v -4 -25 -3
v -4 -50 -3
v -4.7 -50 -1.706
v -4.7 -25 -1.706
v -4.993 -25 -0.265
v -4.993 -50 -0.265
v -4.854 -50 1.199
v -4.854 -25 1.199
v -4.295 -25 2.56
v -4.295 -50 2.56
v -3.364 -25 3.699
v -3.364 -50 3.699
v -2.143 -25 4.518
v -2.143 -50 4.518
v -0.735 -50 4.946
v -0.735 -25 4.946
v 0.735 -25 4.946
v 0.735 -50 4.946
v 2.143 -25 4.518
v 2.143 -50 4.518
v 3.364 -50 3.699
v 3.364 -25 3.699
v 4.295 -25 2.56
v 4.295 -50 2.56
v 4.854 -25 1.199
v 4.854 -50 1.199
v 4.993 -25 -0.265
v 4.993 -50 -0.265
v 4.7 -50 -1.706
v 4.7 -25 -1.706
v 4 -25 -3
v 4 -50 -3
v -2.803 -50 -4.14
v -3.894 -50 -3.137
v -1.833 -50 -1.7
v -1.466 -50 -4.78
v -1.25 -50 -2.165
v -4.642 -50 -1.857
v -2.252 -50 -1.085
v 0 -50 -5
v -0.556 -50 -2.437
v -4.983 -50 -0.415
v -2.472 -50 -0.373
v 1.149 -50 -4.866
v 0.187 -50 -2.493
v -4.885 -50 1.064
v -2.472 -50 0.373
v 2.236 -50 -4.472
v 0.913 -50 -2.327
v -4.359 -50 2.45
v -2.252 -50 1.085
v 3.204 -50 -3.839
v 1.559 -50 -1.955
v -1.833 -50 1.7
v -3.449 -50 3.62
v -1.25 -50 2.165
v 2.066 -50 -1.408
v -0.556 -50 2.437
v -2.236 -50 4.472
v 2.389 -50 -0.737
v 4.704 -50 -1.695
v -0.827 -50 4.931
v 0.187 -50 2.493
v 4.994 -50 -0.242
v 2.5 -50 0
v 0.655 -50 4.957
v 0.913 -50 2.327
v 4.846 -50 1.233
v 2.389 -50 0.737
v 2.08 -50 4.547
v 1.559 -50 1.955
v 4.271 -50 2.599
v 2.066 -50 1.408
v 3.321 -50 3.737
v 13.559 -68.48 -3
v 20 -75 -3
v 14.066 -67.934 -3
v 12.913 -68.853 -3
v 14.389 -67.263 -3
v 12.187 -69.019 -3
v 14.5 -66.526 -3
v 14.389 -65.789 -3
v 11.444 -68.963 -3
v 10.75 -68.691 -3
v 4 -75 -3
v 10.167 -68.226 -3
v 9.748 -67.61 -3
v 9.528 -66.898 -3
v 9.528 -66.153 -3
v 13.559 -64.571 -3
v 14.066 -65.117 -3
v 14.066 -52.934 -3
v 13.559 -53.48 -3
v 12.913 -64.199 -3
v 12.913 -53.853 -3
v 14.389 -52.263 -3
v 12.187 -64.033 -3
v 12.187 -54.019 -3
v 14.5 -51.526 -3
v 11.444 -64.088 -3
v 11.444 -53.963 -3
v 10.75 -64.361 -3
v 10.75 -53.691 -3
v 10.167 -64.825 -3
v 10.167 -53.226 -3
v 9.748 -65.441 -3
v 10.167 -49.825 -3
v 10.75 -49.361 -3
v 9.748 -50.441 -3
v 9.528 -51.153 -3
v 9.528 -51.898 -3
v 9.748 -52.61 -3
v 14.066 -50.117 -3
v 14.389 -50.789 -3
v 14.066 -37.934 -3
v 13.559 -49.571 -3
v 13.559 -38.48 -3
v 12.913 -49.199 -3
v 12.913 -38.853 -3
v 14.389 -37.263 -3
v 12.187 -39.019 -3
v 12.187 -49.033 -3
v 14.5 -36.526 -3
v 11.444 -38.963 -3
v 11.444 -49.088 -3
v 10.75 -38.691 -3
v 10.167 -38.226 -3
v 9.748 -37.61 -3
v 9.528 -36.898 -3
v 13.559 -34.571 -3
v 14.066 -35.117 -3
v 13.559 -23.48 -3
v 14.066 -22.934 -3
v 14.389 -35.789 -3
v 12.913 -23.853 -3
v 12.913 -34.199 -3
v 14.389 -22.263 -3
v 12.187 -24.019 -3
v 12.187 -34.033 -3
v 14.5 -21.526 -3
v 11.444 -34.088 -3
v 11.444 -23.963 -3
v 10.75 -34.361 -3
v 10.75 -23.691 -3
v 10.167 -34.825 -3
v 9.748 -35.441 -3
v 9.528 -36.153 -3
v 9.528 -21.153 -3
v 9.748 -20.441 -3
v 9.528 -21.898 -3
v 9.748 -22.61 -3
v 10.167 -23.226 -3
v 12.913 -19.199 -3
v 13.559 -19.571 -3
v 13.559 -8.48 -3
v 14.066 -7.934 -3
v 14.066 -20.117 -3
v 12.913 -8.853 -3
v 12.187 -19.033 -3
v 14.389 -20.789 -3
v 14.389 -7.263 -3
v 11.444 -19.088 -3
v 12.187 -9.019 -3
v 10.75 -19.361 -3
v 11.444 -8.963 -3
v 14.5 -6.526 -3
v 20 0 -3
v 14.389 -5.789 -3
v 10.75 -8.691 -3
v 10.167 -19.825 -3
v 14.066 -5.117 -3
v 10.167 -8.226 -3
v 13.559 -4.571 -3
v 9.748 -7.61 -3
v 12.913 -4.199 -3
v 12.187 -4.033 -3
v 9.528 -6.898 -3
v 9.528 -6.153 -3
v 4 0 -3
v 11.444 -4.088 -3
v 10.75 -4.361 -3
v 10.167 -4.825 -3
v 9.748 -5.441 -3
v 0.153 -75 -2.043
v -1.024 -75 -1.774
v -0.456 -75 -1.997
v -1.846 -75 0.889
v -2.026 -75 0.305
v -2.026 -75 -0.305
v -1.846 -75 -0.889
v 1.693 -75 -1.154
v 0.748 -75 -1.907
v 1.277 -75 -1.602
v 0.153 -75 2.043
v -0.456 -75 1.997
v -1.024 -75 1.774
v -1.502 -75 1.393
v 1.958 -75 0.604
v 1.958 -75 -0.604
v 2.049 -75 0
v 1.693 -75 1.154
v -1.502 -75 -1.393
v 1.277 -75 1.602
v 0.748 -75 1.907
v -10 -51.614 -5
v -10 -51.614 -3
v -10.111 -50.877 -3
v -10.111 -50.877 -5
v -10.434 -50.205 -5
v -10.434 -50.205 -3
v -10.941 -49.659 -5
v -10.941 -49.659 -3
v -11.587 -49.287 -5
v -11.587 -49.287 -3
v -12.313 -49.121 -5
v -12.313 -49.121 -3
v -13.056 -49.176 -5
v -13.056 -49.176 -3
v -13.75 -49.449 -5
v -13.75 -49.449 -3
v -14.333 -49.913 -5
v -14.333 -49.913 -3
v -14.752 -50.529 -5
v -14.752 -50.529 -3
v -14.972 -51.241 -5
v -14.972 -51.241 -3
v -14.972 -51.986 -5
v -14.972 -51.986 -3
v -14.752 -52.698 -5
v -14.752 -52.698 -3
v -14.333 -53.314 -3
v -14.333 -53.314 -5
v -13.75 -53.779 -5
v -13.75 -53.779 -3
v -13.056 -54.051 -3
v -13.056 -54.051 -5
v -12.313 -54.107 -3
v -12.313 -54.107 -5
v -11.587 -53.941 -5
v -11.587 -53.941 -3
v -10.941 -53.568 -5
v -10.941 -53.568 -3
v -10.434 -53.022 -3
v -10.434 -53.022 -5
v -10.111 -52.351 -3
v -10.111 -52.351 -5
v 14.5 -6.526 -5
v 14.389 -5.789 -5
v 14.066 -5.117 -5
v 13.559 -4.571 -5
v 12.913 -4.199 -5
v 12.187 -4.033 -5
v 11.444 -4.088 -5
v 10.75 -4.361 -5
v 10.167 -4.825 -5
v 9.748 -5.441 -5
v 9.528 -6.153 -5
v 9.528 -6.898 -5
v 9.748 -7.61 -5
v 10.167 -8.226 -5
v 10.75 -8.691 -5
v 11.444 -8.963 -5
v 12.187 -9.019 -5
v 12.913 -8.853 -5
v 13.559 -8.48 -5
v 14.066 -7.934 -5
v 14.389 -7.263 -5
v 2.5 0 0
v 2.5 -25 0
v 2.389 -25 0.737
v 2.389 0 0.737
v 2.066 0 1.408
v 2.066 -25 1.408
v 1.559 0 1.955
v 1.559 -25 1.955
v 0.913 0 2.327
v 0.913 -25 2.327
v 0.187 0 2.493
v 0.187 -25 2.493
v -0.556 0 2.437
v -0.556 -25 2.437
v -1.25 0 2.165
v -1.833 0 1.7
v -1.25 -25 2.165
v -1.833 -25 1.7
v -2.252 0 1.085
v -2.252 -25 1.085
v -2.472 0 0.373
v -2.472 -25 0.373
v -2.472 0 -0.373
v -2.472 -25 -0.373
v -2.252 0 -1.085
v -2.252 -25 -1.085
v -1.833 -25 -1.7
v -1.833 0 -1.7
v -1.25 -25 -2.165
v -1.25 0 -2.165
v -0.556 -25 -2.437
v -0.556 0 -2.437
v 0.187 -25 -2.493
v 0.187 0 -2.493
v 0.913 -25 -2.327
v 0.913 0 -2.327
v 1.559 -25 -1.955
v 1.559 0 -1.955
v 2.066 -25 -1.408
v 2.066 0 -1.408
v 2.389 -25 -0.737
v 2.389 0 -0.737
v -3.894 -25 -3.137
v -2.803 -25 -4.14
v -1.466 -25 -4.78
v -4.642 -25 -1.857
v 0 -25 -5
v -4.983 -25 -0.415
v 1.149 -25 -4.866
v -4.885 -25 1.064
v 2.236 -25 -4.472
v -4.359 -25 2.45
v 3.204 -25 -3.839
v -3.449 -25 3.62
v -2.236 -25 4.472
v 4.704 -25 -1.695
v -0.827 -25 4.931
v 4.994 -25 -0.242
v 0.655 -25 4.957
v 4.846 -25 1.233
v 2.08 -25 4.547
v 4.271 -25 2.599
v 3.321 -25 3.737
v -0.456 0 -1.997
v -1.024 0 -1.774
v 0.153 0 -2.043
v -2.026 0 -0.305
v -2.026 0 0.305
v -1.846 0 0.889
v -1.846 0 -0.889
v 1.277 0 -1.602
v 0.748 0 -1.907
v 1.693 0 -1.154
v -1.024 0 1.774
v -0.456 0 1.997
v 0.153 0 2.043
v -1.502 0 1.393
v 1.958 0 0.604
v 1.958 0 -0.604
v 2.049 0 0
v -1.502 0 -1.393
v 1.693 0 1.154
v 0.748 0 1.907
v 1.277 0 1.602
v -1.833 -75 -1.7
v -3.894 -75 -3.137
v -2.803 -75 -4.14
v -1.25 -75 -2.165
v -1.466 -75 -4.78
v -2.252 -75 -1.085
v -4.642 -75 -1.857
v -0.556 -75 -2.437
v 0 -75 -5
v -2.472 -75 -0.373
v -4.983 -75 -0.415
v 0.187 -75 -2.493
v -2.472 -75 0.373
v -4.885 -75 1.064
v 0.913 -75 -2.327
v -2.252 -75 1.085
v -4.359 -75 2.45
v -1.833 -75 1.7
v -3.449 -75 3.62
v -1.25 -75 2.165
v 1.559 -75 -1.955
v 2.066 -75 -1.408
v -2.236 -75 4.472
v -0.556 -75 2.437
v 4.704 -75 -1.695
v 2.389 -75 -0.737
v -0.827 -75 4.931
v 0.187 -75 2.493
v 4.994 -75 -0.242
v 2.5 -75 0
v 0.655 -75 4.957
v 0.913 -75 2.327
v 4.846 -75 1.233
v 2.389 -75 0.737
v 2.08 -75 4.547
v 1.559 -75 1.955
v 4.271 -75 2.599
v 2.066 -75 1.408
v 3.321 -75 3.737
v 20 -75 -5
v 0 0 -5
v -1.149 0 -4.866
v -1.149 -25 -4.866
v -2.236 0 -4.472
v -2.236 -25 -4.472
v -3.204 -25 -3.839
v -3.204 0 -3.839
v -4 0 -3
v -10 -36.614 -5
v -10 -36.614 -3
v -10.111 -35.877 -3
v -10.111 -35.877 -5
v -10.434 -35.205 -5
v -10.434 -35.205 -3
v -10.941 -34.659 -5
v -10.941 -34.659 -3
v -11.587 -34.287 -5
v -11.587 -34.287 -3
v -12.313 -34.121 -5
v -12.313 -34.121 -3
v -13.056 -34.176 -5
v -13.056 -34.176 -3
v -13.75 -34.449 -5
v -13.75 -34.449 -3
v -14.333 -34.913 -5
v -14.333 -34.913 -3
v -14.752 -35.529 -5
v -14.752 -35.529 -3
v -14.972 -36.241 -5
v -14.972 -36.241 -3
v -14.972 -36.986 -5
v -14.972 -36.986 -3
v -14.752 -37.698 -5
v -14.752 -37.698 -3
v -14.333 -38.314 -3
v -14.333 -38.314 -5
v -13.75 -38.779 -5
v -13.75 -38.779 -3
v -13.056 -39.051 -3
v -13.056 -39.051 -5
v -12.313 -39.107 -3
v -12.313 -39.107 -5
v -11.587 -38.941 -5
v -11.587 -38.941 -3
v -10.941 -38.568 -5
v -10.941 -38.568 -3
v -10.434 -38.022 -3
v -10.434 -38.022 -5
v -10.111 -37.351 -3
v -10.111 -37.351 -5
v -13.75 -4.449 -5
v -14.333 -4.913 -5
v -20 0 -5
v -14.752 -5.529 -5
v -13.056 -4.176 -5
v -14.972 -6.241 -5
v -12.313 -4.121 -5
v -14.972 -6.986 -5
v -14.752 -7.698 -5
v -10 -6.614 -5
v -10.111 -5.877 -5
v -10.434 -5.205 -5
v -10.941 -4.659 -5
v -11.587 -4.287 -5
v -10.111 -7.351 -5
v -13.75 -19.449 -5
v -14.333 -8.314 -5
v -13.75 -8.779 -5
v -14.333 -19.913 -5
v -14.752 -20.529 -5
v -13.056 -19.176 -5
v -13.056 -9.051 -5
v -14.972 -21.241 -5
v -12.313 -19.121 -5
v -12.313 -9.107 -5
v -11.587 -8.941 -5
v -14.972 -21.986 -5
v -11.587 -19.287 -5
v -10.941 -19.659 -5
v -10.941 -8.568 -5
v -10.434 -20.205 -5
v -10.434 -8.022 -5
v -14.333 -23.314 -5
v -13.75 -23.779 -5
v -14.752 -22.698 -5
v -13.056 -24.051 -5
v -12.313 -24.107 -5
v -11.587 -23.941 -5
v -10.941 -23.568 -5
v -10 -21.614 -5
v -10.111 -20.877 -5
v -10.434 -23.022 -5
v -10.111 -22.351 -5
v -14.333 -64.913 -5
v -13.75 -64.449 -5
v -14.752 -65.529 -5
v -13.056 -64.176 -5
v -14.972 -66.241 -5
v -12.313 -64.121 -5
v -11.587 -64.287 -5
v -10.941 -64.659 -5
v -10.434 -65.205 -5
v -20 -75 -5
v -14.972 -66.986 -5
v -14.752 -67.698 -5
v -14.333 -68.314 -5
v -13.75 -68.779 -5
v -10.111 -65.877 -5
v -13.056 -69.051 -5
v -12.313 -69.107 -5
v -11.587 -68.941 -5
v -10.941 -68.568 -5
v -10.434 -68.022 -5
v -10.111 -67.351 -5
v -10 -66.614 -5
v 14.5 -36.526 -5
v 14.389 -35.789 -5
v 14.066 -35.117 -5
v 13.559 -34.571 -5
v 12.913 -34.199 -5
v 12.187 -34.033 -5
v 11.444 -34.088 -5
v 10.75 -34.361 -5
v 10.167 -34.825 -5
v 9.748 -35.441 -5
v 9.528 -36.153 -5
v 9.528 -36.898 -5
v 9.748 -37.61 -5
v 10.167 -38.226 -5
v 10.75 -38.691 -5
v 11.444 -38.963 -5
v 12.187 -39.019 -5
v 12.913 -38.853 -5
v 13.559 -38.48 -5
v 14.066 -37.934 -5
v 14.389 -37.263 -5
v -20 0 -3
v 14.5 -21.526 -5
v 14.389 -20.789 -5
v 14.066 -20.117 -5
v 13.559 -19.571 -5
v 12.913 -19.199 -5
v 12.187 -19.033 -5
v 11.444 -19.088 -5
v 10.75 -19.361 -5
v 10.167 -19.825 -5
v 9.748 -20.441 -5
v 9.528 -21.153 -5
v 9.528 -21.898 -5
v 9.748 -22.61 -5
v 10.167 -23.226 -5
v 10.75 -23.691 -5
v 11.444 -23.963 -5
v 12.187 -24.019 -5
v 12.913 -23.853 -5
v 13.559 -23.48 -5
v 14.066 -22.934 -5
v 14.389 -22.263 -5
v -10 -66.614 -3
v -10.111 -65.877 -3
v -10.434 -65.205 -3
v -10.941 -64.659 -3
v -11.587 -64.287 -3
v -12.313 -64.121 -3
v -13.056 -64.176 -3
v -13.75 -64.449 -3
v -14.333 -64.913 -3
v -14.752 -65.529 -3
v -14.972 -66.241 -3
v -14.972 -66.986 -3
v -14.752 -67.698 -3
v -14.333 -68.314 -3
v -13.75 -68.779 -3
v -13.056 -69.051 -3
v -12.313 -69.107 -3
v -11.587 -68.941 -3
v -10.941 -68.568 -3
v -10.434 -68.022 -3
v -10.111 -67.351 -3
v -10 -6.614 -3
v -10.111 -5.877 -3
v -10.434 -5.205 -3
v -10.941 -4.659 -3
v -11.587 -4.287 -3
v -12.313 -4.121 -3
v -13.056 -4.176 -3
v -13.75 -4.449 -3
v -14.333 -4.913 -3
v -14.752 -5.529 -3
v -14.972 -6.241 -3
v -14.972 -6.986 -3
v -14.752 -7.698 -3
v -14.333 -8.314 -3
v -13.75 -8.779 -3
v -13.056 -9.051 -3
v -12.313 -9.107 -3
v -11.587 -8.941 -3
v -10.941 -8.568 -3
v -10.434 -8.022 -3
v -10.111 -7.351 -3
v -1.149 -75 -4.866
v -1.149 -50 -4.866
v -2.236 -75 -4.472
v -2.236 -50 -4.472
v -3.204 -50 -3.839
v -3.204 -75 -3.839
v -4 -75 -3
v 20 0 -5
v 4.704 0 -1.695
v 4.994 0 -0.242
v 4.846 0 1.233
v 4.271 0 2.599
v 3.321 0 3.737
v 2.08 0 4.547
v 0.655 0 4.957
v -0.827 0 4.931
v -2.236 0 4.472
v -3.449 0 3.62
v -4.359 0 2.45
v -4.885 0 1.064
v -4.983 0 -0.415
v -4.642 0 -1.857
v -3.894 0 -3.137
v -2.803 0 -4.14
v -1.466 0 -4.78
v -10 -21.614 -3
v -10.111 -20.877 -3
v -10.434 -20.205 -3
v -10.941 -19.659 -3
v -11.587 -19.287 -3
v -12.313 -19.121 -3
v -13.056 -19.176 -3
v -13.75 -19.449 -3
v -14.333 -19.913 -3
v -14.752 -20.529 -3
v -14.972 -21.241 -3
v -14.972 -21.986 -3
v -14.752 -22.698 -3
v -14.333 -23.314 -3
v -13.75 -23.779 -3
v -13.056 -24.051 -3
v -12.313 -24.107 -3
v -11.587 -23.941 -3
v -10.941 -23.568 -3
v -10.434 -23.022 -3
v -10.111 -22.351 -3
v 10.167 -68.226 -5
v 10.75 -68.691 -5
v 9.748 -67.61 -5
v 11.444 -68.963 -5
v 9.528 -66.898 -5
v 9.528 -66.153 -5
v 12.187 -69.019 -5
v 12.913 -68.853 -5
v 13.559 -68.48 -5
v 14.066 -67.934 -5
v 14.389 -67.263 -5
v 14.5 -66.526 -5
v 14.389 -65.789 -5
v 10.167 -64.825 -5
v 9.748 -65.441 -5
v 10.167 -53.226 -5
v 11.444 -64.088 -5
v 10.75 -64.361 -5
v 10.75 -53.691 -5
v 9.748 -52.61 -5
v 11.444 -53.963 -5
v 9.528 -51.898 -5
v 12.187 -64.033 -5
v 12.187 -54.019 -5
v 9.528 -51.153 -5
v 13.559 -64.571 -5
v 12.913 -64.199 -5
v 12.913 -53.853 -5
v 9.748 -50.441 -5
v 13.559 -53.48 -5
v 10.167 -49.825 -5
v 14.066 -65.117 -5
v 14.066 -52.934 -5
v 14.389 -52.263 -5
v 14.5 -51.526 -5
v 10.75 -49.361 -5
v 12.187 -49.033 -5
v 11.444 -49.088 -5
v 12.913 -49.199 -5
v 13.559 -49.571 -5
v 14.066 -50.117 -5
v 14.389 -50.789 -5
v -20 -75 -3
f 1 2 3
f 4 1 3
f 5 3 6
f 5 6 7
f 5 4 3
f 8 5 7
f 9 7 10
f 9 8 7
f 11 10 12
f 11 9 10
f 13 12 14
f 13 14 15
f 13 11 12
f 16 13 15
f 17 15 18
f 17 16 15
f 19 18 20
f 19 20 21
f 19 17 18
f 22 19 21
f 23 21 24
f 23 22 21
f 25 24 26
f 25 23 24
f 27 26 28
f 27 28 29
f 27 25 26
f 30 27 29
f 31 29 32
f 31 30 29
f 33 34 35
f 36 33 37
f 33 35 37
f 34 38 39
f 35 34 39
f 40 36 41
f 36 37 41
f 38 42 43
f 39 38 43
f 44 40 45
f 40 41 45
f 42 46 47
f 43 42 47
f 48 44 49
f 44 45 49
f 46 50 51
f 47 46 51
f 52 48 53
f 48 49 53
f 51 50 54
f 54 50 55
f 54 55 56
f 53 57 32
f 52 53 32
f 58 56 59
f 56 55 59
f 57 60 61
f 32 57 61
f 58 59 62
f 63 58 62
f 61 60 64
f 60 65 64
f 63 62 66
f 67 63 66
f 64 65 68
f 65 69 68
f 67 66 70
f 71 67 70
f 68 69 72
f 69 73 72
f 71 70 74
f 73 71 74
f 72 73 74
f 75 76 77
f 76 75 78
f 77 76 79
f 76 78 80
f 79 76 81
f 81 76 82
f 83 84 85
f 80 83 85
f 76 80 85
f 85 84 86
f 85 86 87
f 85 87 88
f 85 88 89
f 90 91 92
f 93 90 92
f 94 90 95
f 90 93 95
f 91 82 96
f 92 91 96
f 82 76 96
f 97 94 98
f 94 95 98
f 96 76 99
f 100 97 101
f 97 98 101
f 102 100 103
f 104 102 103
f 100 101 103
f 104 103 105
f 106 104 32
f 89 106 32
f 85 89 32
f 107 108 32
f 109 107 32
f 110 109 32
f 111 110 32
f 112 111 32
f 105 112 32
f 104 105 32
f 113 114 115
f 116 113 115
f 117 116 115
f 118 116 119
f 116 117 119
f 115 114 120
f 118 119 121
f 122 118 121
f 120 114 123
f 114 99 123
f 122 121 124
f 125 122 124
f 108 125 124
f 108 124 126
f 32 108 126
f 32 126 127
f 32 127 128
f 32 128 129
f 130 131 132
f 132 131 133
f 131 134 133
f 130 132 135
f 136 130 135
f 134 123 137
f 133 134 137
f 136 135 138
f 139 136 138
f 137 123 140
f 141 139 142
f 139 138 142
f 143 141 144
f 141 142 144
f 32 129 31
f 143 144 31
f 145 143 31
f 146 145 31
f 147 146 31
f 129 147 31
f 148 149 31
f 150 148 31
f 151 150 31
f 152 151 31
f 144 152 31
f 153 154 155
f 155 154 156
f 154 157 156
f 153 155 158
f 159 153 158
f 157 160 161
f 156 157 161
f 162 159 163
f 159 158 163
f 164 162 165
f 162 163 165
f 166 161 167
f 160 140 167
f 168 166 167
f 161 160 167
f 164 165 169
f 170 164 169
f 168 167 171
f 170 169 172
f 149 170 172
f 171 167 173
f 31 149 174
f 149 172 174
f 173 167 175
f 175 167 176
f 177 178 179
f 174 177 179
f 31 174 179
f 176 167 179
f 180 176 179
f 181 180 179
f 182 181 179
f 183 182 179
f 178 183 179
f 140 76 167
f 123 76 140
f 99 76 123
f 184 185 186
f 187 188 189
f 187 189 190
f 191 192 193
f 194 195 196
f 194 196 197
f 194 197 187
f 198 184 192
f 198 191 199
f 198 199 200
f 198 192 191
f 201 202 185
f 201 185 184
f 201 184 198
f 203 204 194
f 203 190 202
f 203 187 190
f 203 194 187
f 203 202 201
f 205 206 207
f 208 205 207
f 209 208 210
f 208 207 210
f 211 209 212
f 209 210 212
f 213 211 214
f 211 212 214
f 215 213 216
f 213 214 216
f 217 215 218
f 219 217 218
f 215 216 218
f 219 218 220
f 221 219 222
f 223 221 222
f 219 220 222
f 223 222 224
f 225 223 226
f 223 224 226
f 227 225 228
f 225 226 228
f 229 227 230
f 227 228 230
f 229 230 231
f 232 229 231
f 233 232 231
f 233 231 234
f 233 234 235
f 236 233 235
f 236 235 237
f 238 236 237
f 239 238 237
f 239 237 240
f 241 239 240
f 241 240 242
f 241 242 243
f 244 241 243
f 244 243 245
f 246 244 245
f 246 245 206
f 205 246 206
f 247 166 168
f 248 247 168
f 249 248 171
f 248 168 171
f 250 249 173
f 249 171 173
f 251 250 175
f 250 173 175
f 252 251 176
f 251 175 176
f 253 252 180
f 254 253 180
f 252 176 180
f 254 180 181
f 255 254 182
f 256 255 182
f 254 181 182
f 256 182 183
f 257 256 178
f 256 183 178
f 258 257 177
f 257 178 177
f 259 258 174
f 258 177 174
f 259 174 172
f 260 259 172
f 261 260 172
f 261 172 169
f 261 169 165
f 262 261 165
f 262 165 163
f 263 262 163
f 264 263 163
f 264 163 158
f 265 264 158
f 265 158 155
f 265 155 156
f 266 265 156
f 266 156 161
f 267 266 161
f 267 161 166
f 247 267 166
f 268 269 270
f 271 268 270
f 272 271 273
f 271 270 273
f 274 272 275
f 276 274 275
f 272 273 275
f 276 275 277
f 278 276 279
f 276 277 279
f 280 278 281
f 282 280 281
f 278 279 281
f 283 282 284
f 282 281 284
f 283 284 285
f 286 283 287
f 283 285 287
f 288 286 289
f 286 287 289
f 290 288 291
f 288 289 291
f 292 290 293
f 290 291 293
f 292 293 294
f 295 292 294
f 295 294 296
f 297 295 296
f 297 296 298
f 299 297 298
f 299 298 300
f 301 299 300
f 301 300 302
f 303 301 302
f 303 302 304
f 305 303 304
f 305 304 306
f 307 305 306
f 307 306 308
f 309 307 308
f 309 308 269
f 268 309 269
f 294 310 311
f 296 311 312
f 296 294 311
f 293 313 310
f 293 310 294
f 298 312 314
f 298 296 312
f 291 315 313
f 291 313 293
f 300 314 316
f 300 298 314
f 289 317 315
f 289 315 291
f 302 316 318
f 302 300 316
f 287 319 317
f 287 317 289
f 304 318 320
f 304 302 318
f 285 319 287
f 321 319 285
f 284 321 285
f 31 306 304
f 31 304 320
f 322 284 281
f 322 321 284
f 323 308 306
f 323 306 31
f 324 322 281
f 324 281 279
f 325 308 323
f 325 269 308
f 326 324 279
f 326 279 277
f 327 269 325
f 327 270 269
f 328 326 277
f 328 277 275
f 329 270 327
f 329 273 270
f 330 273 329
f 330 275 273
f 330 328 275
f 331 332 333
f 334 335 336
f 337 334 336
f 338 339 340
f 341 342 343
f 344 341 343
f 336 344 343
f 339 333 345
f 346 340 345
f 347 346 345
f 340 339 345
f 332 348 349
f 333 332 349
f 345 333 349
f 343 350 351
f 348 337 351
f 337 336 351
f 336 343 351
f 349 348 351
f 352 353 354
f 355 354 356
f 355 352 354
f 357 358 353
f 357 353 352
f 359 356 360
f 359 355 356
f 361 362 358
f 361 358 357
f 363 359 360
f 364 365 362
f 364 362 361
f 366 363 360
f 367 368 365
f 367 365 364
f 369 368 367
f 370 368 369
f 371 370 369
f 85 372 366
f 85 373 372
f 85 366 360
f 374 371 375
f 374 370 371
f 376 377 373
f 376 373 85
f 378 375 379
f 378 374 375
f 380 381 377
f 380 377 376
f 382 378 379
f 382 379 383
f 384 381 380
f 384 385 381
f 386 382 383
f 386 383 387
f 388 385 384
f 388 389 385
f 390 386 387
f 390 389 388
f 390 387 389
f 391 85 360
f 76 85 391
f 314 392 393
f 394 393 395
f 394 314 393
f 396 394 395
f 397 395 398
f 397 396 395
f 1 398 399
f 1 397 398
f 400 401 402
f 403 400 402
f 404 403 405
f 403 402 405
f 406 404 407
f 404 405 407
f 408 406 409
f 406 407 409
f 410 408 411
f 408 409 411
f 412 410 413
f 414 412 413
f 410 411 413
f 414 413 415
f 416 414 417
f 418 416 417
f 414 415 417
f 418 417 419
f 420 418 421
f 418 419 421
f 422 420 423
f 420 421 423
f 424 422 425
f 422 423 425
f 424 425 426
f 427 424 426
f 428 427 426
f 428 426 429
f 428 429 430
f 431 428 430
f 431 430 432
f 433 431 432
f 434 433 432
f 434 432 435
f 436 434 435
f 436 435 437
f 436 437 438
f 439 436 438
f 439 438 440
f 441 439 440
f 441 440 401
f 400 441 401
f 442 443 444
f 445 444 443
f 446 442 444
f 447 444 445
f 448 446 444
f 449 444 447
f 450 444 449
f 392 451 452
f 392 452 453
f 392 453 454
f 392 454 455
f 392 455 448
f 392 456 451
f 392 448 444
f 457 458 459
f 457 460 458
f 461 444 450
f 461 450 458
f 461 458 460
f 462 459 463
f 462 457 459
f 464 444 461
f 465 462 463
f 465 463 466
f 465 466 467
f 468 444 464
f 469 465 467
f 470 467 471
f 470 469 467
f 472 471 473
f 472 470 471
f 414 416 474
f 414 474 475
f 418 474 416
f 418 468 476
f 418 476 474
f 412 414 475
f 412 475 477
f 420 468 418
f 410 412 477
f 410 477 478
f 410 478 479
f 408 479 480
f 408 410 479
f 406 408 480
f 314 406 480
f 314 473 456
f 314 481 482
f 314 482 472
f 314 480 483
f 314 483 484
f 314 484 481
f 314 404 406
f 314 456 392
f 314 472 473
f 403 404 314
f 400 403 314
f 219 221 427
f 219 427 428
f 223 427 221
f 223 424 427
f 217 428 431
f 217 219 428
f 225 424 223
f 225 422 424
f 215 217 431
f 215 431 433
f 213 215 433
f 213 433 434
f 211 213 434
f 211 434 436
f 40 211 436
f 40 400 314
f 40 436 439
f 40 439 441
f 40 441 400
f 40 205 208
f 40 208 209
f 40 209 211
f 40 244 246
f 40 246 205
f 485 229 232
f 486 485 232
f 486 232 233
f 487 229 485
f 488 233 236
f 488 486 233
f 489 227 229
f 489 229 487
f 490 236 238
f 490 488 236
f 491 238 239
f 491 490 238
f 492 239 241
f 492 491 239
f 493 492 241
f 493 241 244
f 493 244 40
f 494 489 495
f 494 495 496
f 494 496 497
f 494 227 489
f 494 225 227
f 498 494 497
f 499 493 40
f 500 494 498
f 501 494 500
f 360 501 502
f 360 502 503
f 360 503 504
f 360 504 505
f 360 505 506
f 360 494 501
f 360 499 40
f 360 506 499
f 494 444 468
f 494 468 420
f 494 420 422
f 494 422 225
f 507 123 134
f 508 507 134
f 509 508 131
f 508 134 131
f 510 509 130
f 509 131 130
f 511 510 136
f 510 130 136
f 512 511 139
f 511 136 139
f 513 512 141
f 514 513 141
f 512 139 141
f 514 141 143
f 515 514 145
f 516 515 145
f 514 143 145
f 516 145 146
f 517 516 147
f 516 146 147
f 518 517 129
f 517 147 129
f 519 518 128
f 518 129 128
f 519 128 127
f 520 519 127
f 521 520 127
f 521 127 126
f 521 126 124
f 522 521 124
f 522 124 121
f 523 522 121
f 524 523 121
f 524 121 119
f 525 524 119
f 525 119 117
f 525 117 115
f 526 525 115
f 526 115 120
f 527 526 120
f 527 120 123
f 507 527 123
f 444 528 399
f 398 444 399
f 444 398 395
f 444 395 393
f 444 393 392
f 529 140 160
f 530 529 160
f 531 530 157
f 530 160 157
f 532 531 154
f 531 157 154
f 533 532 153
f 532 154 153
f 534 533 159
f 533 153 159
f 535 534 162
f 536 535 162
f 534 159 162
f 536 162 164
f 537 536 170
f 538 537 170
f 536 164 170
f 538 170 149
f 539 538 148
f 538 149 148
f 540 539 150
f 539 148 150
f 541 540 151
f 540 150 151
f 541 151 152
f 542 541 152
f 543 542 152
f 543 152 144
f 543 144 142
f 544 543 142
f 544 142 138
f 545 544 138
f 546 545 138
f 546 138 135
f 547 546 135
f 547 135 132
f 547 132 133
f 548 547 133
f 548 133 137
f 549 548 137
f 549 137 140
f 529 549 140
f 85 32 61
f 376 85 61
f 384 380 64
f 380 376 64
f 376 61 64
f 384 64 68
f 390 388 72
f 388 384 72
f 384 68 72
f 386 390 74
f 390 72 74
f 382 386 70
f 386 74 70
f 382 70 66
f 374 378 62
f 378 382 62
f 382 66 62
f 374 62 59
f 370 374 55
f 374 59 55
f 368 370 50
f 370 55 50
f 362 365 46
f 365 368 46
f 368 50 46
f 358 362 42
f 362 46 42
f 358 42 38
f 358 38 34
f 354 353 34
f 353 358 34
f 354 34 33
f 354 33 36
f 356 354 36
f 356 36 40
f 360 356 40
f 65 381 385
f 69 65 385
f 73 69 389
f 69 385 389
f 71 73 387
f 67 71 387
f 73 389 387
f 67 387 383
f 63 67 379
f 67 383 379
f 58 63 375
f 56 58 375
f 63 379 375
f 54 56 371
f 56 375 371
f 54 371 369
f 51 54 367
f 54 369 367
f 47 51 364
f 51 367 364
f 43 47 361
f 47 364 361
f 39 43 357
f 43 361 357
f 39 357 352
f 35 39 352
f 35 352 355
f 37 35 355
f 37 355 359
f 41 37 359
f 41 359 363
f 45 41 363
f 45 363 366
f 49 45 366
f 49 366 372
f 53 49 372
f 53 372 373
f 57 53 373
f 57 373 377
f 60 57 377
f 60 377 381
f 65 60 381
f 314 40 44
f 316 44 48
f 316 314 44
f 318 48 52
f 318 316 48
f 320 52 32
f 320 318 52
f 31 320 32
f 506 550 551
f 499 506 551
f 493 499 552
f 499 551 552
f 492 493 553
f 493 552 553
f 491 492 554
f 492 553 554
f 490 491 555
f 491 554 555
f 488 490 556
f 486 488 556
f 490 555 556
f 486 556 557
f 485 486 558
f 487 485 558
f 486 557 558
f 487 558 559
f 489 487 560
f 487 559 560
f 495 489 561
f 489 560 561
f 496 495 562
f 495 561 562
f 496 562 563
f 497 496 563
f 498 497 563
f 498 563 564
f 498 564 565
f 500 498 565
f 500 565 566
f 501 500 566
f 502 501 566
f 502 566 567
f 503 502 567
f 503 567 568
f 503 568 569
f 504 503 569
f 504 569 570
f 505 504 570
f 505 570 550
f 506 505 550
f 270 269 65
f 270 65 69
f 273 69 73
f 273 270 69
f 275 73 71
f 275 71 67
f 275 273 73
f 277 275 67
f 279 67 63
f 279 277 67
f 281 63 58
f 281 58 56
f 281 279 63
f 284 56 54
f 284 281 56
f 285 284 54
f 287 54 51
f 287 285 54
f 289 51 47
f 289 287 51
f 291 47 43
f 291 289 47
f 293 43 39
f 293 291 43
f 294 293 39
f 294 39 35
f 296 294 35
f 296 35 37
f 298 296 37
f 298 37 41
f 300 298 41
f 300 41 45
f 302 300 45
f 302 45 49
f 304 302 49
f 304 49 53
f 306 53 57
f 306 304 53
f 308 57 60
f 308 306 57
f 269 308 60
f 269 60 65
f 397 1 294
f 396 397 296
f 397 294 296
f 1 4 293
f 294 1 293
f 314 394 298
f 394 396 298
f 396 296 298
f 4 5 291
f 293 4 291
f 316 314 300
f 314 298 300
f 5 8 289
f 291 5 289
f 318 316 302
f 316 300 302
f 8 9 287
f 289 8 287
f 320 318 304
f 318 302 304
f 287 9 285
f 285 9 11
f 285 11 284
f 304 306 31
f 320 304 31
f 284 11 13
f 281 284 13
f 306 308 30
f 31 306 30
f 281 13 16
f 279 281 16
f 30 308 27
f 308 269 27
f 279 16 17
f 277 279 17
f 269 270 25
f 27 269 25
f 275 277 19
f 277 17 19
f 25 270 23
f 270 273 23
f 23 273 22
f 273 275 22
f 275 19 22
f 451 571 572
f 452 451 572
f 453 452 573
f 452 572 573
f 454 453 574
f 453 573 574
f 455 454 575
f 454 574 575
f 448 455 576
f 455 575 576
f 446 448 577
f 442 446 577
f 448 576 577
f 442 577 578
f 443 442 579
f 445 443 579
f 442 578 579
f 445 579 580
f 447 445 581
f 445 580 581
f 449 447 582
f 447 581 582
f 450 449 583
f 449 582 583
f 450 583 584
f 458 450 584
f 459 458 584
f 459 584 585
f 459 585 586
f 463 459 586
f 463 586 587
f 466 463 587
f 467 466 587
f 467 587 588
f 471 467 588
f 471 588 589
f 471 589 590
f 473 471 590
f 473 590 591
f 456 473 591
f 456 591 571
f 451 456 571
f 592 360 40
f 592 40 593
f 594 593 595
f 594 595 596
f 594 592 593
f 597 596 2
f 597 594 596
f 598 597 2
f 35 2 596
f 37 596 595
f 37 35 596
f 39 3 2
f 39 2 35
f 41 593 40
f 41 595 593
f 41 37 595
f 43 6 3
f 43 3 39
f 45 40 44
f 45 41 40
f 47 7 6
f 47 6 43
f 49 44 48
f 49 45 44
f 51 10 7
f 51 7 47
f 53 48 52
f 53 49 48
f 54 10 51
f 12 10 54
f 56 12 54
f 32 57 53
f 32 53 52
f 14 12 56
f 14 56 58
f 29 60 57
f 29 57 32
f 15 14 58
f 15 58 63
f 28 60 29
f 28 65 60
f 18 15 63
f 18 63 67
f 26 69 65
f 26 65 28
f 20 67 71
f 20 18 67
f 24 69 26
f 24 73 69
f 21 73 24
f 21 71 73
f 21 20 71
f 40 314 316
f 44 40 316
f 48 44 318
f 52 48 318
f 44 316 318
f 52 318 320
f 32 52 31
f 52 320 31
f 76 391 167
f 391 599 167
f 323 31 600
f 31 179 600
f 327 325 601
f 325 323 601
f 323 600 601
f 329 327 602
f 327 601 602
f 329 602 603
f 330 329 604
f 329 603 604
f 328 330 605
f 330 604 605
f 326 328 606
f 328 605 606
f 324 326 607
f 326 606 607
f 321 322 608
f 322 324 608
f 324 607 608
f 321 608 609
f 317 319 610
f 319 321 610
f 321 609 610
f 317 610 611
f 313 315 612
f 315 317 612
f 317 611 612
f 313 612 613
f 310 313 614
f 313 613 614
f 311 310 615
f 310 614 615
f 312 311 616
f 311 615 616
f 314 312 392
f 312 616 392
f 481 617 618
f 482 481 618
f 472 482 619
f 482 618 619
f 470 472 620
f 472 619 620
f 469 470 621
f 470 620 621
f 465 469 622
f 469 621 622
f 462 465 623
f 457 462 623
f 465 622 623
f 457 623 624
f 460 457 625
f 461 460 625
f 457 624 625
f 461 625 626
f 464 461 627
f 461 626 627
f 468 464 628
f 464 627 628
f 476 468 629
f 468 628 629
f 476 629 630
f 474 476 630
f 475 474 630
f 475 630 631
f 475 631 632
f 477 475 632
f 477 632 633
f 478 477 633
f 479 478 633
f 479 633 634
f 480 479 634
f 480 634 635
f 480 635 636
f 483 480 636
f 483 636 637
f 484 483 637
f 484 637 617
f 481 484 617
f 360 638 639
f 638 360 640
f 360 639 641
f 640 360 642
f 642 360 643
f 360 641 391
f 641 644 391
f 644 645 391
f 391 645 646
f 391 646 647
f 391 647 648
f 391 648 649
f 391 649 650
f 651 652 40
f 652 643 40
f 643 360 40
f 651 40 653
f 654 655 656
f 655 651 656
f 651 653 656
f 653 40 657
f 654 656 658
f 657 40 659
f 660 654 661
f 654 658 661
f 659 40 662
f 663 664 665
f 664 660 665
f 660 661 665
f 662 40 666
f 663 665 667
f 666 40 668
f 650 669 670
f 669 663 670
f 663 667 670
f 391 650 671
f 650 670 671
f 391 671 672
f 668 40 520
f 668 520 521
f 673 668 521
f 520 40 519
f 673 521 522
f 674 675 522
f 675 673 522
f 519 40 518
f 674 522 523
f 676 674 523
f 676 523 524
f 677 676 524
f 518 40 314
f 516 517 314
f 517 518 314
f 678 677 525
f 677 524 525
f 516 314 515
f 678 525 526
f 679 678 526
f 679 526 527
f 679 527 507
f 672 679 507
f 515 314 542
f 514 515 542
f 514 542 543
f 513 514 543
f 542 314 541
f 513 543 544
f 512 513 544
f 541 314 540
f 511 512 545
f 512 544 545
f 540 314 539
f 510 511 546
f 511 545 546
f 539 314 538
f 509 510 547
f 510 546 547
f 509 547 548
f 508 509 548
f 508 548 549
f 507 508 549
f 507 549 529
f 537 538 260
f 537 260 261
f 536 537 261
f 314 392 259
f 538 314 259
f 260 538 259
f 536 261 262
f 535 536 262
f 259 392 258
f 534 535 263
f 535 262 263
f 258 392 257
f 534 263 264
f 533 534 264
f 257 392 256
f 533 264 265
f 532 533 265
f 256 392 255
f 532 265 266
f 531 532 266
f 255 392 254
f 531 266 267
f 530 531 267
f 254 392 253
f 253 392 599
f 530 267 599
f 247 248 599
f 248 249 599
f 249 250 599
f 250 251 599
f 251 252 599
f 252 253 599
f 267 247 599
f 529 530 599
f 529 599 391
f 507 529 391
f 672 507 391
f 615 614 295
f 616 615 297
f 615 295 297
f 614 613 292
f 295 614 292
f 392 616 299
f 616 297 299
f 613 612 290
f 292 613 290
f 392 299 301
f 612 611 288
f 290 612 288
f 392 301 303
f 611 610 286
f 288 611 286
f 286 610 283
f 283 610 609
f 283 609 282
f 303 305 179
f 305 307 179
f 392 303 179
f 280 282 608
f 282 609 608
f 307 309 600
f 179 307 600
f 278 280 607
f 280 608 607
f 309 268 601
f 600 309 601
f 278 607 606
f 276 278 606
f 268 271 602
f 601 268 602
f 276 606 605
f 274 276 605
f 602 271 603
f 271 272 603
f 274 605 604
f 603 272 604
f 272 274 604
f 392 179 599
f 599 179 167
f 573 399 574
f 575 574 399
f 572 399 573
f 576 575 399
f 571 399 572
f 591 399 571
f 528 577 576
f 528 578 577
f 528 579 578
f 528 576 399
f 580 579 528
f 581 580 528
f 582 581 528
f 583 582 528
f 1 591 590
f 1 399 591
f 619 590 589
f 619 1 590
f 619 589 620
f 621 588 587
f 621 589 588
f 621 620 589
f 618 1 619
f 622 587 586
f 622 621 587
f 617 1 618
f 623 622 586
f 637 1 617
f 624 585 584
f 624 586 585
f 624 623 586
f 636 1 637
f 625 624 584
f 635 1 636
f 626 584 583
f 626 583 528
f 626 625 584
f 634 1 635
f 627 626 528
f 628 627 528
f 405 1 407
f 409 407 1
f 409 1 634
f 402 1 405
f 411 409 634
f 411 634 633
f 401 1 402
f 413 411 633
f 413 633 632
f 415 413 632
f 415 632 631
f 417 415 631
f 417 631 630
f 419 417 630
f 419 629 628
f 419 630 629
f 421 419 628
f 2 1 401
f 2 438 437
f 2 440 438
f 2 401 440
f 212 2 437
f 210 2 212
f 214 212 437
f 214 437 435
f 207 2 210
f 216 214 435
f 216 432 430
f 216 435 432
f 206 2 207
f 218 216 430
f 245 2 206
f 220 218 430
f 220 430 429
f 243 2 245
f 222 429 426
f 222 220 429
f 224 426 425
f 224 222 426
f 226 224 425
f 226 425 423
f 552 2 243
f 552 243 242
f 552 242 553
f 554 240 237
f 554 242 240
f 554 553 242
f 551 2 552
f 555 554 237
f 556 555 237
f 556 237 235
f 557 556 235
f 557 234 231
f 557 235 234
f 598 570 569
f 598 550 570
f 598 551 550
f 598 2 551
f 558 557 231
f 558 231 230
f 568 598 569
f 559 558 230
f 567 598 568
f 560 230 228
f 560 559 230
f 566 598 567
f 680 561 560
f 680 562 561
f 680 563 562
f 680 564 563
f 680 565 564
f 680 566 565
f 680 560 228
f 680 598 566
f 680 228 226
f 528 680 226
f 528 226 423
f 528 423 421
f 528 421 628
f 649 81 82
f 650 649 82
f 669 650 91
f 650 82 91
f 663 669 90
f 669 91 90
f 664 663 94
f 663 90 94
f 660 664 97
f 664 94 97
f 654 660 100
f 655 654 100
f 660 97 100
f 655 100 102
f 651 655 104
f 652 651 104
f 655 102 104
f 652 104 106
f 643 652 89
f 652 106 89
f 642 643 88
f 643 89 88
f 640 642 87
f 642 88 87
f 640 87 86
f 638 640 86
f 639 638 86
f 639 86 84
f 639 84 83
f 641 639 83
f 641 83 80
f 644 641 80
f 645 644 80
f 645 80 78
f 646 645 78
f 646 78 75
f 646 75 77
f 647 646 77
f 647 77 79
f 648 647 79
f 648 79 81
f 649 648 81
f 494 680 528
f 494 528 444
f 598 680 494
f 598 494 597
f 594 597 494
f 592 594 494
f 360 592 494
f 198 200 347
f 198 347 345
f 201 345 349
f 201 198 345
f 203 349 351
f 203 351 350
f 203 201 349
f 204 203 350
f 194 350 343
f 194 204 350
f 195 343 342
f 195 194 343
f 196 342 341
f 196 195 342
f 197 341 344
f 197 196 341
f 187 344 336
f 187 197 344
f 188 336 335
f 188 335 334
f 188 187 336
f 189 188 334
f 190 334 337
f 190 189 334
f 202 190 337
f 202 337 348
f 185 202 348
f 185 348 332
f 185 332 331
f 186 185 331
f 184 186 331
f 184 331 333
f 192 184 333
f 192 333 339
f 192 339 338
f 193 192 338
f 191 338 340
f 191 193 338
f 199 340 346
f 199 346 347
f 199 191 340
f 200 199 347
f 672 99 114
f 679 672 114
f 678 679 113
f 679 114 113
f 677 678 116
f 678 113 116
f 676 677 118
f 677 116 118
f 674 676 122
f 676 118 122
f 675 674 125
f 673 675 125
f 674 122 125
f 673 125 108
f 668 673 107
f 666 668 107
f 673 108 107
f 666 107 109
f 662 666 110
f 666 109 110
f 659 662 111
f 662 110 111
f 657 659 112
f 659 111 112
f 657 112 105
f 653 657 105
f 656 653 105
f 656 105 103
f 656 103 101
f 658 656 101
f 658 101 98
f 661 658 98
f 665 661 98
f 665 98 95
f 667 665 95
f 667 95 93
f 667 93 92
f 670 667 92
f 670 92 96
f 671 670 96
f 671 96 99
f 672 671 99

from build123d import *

# Parameters (mm, degrees)
F0_R      = 5
F2_DEPTH  = 25
F1_W      = 20
F1_H      = 2
F3_DEPTH  = 25
F5_DEPTH  = 25
F4_R      = 5
F6_DEPTH  = 25
F7_R      = 2.5
F8_DEPTH  = 85.7
F9_DEPTH  = 25
F10_R     = 5
F11_DEPTH = 25
F12_R     = 2.5
F13_DEPTH = 25
F15_DEPTH = 75
F16_DEPTH = 25
F17_R     = 2.0487384395
F18_DEPTH = 75
F19_R     = 2.5
F20_DEPTH = 25


with BuildPart() as f2:
    # F0 (on Front) → F2 (new body)
    with BuildSketch(Plane.XZ):
        Circle(F0_R)
    extrude(amount=F2_DEPTH)



with BuildPart() as f2b:
    # F1 (on Front) → F2, piece 2 (new body)
    with BuildSketch(Plane.XZ):
        with Locations((10, -4)):
            Rectangle(F1_W, F1_H)
    extrude(amount=F2_DEPTH)


with BuildPart() as f2_1:
    add(f2.part)
    # F3 (add): a face of the model
    f3_faces = [f2b.part.faces().sort_by_distance(p)[0] for p in [
        (10, -25, -4),
    ]]

    add(f2b.part)  # F3 merges F2b
    extrude(f3_faces, amount=F3_DEPTH)

    # F4 (on face) → F5 (join)
    with BuildSketch(Plane.XZ.offset(50)):
        with BuildLine():
            ThreePointArc((4, -3), (2.2360679775, -4.472135955), (0, -5))
            Line((0, -5), (20, -5))
            Line((20, -5), (20, -3))
            Line((20, -3), (4, -3))
        make_face()
    extrude(amount=F5_DEPTH)

    # F4 (on face) → F6 (join)
    with BuildSketch(Plane.XZ.offset(50)):
        Circle(F4_R)
    extrude(amount=F6_DEPTH)

    # F7 (on face) → F8 (cut)
    with BuildSketch(Plane.XZ.offset(75)):
        Circle(F7_R)
    extrude(amount=-F8_DEPTH, mode=Mode.SUBTRACT)

    # F9 (cut): a face of the model
    f9_faces = [f2_1.faces().sort_by_distance(p)[0] for p in [
        (2, -25, -2.8585786438),
    ]]
    extrude(f9_faces, amount=F9_DEPTH, mode=Mode.SUBTRACT)

    # F10 (on face) → F11 (cut)
    with BuildSketch(Plane.XZ.offset(25)):
        Circle(F10_R)
    extrude(amount=F11_DEPTH, mode=Mode.SUBTRACT)

    # F12 (on face) → F13 (cut)
    with BuildSketch(Plane.XY.offset(-3)):
        with Locations((12, -6.5256957896)):
            Circle(F12_R)
        with Locations((12.0000014076, -21.5256957896)):
            Circle(F12_R)
        with Locations((12.0000010356, -36.5256957896)):
            Circle(F12_R)
        with Locations((12.0000010356, -51.5256957896)):
            Circle(F12_R)
        with Locations((12.0000010356, -66.5256957896)):
            Circle(F12_R)
    extrude(amount=-F13_DEPTH, mode=Mode.SUBTRACT)


with BuildPart() as f15:
    # F14 (on face) → F15 (new body)
    with BuildSketch(Plane.XZ.offset(75)):
        with BuildLine():
            Line((-20, -5), (0, -5))
            ThreePointArc((0, -5), (-2.2360679775, -4.472135955), (-4, -3))
            Line((-4, -3), (-20, -3))
            Line((-20, -3), (-20, -5))
        make_face()
    extrude(amount=-F15_DEPTH)

    # F16 (add): a face of the model
    f16_faces = [f2_1.part.faces().sort_by_distance(p)[0] for p in [
        (-2.1728224243, -25, 4.3456448486),
    ]]
    extrude(f16_faces, amount=F16_DEPTH)

    # F19 (on face) → F20 (cut)
    with BuildSketch(Plane.XY.offset(-3)):
        with Locations((-12.5, -6.6137607209)):
            Circle(F19_R)
        with Locations((-12.5, -21.6137607209)):
            Circle(F19_R)
        with Locations((-12.5, -36.6137607209)):
            Circle(F19_R)
        with Locations((-12.5, -51.6137607209)):
            Circle(F19_R)
        with Locations((-12.5, -66.6137607209)):
            Circle(F19_R)
    extrude(amount=-F20_DEPTH, mode=Mode.SUBTRACT)


with BuildPart() as f18:
    # F17 (on face) → F18 (new body)
    with BuildSketch(Plane.XZ.offset(75)):
        Circle(F17_R)
    extrude(amount=-F18_DEPTH)


solid = Compound([f2_1.part, f15.part, f18.part])
